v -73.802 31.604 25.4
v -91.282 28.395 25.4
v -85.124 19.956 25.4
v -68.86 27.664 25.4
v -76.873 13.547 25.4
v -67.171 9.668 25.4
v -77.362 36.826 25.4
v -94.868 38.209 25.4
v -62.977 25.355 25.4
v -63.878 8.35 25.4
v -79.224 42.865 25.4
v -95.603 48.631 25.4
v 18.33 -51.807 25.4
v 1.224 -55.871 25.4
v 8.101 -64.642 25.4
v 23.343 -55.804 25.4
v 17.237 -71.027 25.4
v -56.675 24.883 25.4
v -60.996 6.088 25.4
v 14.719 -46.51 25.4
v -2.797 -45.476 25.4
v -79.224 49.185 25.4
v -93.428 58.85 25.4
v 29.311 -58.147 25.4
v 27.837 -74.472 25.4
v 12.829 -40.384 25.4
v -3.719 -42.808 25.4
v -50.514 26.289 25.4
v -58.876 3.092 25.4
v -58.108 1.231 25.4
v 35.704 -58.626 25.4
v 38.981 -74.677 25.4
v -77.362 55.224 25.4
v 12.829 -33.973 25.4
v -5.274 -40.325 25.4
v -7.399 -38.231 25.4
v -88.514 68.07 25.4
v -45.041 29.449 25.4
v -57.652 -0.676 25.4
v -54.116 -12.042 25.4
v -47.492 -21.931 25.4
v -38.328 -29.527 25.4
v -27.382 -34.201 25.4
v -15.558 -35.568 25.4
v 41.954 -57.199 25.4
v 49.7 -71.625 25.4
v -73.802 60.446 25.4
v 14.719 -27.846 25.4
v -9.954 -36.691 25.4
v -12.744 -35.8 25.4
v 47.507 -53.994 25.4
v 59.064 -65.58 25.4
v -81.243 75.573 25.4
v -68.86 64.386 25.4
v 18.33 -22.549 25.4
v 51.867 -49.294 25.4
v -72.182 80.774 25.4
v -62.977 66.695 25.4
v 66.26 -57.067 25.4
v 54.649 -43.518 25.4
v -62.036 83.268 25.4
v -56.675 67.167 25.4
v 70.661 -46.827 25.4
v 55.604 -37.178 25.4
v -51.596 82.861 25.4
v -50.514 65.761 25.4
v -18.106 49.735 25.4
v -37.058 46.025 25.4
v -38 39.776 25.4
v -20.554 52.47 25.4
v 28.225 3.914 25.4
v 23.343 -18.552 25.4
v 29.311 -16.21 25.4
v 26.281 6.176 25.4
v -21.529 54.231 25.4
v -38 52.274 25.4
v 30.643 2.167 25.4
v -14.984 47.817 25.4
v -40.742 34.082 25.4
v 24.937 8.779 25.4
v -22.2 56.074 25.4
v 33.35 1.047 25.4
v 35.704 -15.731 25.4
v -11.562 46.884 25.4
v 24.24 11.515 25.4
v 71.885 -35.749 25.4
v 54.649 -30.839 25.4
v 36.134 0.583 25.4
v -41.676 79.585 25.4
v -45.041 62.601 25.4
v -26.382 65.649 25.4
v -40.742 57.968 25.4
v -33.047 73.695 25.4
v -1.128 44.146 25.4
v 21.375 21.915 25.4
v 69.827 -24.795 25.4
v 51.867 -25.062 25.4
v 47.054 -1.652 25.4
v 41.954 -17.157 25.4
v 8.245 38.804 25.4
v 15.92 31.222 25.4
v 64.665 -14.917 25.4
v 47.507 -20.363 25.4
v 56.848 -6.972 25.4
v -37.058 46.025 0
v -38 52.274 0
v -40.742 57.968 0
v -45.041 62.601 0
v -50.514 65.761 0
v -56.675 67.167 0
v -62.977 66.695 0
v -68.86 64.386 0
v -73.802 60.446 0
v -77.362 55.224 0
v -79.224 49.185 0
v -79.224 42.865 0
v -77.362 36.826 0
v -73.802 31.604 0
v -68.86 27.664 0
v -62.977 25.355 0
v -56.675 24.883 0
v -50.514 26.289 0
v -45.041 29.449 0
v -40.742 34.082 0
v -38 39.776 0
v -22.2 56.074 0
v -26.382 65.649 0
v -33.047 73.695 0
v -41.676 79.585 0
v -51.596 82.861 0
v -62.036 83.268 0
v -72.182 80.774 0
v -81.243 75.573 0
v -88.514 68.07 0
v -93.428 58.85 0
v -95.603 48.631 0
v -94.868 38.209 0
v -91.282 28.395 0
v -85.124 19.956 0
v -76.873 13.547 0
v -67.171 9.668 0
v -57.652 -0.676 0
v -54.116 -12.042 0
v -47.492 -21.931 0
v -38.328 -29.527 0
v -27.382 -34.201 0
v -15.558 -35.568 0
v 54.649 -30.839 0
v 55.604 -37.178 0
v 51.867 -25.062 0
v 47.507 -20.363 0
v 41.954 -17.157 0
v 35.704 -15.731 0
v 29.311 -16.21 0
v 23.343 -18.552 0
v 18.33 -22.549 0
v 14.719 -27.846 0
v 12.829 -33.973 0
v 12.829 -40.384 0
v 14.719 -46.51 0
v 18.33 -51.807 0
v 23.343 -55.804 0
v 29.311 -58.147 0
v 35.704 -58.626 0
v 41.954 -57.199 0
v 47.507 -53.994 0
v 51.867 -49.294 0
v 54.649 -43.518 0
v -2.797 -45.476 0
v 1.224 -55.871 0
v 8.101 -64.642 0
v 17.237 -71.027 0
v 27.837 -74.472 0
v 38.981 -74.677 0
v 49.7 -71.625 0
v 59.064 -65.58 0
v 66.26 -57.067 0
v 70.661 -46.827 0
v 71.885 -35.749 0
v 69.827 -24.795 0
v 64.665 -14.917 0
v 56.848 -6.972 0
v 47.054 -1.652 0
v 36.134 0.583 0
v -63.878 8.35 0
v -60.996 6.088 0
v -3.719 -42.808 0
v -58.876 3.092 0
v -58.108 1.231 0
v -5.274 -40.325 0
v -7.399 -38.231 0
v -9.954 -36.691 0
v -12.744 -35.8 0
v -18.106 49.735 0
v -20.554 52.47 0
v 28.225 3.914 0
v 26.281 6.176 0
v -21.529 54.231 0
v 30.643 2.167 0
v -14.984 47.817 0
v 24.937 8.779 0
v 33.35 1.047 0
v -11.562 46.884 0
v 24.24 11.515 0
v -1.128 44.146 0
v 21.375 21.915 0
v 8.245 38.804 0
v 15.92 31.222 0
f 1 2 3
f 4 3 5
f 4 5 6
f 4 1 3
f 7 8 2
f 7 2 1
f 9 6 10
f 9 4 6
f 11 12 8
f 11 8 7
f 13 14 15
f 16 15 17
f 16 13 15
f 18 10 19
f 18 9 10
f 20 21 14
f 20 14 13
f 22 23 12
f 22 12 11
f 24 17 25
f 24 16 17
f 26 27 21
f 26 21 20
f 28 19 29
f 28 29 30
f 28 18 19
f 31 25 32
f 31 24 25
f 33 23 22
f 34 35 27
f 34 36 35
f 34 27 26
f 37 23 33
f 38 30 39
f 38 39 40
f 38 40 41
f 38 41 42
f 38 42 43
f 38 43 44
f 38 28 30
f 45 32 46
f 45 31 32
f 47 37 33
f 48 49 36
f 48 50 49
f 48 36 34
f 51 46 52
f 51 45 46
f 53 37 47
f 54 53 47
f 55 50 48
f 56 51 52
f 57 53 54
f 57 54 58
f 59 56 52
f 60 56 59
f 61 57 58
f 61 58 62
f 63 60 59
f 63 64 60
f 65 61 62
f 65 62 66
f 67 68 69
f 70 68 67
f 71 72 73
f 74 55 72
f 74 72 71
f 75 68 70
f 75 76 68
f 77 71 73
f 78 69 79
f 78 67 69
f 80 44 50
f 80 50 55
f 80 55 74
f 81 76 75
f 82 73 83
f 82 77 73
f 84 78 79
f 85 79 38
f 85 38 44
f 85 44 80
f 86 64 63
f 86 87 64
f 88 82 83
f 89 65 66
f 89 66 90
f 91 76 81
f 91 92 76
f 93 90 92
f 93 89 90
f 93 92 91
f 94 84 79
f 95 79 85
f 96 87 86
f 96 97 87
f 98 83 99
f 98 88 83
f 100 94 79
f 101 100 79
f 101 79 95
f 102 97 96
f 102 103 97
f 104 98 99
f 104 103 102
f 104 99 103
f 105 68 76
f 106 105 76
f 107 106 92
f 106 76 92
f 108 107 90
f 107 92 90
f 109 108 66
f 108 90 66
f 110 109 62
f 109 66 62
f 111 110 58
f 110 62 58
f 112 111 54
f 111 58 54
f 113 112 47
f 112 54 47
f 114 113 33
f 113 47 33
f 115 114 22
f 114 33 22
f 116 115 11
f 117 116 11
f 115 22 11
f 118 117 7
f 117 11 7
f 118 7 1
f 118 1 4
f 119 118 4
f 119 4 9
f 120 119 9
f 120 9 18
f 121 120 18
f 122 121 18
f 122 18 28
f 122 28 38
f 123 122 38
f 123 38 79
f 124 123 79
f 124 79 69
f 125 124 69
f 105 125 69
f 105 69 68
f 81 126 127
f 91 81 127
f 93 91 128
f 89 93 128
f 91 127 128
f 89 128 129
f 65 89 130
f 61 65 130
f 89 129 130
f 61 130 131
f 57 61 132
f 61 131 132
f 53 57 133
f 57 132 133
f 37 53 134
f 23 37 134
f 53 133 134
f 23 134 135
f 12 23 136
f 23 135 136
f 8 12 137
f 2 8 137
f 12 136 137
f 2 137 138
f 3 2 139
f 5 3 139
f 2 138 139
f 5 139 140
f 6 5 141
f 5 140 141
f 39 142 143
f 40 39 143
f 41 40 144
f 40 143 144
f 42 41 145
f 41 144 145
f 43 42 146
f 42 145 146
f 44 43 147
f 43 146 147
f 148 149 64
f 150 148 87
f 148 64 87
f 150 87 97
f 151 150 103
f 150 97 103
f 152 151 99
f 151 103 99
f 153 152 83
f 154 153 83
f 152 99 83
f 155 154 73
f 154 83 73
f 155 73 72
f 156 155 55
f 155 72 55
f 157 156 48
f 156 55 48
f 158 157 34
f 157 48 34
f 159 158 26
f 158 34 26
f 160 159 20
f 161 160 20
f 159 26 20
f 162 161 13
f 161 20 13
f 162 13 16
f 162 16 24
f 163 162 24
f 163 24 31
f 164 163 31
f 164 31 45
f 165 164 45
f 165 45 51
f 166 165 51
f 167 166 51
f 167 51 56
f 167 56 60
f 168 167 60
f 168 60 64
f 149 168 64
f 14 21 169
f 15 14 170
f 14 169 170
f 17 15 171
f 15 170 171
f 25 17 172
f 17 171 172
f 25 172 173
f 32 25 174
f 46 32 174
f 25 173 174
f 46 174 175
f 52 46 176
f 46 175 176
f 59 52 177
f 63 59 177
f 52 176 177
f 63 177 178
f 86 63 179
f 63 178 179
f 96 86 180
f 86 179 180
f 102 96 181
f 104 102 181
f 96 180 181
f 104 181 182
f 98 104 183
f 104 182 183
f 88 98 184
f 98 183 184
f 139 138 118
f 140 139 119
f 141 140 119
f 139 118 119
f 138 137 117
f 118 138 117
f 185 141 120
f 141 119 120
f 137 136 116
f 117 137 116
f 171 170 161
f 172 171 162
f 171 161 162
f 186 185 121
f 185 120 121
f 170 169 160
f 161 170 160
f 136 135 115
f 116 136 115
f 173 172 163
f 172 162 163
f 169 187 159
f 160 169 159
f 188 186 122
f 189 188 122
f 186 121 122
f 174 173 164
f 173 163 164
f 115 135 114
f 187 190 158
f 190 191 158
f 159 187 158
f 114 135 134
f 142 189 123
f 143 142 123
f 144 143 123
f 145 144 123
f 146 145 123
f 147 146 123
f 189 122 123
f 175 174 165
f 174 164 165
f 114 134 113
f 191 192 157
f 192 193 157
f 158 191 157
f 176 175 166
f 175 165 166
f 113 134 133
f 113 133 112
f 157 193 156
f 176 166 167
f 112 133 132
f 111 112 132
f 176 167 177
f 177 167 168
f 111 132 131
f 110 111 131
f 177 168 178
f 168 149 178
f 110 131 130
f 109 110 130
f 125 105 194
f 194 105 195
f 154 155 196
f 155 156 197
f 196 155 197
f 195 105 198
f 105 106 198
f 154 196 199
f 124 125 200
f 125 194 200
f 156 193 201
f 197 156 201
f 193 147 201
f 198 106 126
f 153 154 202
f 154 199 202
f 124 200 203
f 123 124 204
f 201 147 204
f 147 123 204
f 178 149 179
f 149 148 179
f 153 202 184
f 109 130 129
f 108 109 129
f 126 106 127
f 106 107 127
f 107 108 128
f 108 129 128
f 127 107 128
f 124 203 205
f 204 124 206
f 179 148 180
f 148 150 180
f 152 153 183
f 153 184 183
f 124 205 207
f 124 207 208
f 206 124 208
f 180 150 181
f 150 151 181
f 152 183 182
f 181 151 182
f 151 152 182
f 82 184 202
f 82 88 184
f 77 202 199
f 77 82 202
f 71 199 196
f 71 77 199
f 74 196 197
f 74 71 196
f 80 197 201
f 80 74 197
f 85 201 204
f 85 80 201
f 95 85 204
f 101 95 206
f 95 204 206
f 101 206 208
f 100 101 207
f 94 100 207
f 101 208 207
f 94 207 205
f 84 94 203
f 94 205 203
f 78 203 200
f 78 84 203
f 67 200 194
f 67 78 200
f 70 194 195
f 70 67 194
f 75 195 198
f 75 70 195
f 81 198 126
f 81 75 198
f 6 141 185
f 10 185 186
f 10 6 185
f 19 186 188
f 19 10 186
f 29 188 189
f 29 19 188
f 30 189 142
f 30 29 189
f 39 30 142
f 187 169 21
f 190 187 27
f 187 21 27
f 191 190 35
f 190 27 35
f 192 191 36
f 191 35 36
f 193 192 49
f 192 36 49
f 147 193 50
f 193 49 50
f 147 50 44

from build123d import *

# Parameters (mm, degrees)
F1_DEPTH = 25.4
F2_R     = 21.201503
F3_DEPTH = 25.401
F4_R     = 12.7
F5_R     = 12.7
F6_R     = 12.7
F7_R     = 12.7
F8_R     = 21.507739
F9_DEPTH = 25.401


with BuildPart() as f1:
    # F0 (on Top) → F1 (new body)
    with BuildSketch(Plane.XY):
        with BuildLine():
            ThreePointArc((24.118333, -0.702734), (13.366391, 34.203378), (-20.838827, 47.011342))
            ThreePointArc((-20.838827, 47.011342), (-85.141829, 72.076017), (-58.070359, 8.591772))
            ThreePointArc((-58.070359, 8.591772), (-42.025812, -26.985416), (-3.531117, -33.413651))
            ThreePointArc((-3.531117, -33.413651), (62.977366, -61.590022), (24.118333, -0.702734))
        make_face()
    extrude(amount=F1_DEPTH)

    # F2 (on face) → F3 (cut, through all)
    with BuildSketch(Plane.XY.offset(25.4)):
        with Locations((-58.259711, 46.025168)):
            Circle(F2_R)
    extrude(amount=-F3_DEPTH, mode=Mode.SUBTRACT)

    # F4
    f4_edges = [f1.edges().sort_by_distance(p)[0] for p in [
        (-3.531117, -33.413651, 12.7),
    ]]
    fillet(f4_edges, radius=F4_R)

    # F5
    f5_edges = [f1.edges().sort_by_distance(p)[0] for p in [
        (24.118333, -0.702734, 12.7),
    ]]
    fillet(f5_edges, radius=F5_R)

    # F6
    f6_edges = [f1.edges().sort_by_distance(p)[0] for p in [
        (-20.838827, 47.011342, 12.7),
    ]]
    fillet(f6_edges, radius=F6_R)

    # F7
    f7_edges = [f1.edges().sort_by_distance(p)[0] for p in [
        (-58.070359, 8.591772, 12.7),
    ]]
    fillet(f7_edges, radius=F7_R)

    # F8 (on face) → F9 (cut, through all)
    with BuildSketch(Plane.XY.offset(25.4)):
        with Locations((34.096744, -37.178192)):
            Circle(F8_R)
    extrude(amount=-F9_DEPTH, mode=Mode.SUBTRACT)


solid = f1.part
